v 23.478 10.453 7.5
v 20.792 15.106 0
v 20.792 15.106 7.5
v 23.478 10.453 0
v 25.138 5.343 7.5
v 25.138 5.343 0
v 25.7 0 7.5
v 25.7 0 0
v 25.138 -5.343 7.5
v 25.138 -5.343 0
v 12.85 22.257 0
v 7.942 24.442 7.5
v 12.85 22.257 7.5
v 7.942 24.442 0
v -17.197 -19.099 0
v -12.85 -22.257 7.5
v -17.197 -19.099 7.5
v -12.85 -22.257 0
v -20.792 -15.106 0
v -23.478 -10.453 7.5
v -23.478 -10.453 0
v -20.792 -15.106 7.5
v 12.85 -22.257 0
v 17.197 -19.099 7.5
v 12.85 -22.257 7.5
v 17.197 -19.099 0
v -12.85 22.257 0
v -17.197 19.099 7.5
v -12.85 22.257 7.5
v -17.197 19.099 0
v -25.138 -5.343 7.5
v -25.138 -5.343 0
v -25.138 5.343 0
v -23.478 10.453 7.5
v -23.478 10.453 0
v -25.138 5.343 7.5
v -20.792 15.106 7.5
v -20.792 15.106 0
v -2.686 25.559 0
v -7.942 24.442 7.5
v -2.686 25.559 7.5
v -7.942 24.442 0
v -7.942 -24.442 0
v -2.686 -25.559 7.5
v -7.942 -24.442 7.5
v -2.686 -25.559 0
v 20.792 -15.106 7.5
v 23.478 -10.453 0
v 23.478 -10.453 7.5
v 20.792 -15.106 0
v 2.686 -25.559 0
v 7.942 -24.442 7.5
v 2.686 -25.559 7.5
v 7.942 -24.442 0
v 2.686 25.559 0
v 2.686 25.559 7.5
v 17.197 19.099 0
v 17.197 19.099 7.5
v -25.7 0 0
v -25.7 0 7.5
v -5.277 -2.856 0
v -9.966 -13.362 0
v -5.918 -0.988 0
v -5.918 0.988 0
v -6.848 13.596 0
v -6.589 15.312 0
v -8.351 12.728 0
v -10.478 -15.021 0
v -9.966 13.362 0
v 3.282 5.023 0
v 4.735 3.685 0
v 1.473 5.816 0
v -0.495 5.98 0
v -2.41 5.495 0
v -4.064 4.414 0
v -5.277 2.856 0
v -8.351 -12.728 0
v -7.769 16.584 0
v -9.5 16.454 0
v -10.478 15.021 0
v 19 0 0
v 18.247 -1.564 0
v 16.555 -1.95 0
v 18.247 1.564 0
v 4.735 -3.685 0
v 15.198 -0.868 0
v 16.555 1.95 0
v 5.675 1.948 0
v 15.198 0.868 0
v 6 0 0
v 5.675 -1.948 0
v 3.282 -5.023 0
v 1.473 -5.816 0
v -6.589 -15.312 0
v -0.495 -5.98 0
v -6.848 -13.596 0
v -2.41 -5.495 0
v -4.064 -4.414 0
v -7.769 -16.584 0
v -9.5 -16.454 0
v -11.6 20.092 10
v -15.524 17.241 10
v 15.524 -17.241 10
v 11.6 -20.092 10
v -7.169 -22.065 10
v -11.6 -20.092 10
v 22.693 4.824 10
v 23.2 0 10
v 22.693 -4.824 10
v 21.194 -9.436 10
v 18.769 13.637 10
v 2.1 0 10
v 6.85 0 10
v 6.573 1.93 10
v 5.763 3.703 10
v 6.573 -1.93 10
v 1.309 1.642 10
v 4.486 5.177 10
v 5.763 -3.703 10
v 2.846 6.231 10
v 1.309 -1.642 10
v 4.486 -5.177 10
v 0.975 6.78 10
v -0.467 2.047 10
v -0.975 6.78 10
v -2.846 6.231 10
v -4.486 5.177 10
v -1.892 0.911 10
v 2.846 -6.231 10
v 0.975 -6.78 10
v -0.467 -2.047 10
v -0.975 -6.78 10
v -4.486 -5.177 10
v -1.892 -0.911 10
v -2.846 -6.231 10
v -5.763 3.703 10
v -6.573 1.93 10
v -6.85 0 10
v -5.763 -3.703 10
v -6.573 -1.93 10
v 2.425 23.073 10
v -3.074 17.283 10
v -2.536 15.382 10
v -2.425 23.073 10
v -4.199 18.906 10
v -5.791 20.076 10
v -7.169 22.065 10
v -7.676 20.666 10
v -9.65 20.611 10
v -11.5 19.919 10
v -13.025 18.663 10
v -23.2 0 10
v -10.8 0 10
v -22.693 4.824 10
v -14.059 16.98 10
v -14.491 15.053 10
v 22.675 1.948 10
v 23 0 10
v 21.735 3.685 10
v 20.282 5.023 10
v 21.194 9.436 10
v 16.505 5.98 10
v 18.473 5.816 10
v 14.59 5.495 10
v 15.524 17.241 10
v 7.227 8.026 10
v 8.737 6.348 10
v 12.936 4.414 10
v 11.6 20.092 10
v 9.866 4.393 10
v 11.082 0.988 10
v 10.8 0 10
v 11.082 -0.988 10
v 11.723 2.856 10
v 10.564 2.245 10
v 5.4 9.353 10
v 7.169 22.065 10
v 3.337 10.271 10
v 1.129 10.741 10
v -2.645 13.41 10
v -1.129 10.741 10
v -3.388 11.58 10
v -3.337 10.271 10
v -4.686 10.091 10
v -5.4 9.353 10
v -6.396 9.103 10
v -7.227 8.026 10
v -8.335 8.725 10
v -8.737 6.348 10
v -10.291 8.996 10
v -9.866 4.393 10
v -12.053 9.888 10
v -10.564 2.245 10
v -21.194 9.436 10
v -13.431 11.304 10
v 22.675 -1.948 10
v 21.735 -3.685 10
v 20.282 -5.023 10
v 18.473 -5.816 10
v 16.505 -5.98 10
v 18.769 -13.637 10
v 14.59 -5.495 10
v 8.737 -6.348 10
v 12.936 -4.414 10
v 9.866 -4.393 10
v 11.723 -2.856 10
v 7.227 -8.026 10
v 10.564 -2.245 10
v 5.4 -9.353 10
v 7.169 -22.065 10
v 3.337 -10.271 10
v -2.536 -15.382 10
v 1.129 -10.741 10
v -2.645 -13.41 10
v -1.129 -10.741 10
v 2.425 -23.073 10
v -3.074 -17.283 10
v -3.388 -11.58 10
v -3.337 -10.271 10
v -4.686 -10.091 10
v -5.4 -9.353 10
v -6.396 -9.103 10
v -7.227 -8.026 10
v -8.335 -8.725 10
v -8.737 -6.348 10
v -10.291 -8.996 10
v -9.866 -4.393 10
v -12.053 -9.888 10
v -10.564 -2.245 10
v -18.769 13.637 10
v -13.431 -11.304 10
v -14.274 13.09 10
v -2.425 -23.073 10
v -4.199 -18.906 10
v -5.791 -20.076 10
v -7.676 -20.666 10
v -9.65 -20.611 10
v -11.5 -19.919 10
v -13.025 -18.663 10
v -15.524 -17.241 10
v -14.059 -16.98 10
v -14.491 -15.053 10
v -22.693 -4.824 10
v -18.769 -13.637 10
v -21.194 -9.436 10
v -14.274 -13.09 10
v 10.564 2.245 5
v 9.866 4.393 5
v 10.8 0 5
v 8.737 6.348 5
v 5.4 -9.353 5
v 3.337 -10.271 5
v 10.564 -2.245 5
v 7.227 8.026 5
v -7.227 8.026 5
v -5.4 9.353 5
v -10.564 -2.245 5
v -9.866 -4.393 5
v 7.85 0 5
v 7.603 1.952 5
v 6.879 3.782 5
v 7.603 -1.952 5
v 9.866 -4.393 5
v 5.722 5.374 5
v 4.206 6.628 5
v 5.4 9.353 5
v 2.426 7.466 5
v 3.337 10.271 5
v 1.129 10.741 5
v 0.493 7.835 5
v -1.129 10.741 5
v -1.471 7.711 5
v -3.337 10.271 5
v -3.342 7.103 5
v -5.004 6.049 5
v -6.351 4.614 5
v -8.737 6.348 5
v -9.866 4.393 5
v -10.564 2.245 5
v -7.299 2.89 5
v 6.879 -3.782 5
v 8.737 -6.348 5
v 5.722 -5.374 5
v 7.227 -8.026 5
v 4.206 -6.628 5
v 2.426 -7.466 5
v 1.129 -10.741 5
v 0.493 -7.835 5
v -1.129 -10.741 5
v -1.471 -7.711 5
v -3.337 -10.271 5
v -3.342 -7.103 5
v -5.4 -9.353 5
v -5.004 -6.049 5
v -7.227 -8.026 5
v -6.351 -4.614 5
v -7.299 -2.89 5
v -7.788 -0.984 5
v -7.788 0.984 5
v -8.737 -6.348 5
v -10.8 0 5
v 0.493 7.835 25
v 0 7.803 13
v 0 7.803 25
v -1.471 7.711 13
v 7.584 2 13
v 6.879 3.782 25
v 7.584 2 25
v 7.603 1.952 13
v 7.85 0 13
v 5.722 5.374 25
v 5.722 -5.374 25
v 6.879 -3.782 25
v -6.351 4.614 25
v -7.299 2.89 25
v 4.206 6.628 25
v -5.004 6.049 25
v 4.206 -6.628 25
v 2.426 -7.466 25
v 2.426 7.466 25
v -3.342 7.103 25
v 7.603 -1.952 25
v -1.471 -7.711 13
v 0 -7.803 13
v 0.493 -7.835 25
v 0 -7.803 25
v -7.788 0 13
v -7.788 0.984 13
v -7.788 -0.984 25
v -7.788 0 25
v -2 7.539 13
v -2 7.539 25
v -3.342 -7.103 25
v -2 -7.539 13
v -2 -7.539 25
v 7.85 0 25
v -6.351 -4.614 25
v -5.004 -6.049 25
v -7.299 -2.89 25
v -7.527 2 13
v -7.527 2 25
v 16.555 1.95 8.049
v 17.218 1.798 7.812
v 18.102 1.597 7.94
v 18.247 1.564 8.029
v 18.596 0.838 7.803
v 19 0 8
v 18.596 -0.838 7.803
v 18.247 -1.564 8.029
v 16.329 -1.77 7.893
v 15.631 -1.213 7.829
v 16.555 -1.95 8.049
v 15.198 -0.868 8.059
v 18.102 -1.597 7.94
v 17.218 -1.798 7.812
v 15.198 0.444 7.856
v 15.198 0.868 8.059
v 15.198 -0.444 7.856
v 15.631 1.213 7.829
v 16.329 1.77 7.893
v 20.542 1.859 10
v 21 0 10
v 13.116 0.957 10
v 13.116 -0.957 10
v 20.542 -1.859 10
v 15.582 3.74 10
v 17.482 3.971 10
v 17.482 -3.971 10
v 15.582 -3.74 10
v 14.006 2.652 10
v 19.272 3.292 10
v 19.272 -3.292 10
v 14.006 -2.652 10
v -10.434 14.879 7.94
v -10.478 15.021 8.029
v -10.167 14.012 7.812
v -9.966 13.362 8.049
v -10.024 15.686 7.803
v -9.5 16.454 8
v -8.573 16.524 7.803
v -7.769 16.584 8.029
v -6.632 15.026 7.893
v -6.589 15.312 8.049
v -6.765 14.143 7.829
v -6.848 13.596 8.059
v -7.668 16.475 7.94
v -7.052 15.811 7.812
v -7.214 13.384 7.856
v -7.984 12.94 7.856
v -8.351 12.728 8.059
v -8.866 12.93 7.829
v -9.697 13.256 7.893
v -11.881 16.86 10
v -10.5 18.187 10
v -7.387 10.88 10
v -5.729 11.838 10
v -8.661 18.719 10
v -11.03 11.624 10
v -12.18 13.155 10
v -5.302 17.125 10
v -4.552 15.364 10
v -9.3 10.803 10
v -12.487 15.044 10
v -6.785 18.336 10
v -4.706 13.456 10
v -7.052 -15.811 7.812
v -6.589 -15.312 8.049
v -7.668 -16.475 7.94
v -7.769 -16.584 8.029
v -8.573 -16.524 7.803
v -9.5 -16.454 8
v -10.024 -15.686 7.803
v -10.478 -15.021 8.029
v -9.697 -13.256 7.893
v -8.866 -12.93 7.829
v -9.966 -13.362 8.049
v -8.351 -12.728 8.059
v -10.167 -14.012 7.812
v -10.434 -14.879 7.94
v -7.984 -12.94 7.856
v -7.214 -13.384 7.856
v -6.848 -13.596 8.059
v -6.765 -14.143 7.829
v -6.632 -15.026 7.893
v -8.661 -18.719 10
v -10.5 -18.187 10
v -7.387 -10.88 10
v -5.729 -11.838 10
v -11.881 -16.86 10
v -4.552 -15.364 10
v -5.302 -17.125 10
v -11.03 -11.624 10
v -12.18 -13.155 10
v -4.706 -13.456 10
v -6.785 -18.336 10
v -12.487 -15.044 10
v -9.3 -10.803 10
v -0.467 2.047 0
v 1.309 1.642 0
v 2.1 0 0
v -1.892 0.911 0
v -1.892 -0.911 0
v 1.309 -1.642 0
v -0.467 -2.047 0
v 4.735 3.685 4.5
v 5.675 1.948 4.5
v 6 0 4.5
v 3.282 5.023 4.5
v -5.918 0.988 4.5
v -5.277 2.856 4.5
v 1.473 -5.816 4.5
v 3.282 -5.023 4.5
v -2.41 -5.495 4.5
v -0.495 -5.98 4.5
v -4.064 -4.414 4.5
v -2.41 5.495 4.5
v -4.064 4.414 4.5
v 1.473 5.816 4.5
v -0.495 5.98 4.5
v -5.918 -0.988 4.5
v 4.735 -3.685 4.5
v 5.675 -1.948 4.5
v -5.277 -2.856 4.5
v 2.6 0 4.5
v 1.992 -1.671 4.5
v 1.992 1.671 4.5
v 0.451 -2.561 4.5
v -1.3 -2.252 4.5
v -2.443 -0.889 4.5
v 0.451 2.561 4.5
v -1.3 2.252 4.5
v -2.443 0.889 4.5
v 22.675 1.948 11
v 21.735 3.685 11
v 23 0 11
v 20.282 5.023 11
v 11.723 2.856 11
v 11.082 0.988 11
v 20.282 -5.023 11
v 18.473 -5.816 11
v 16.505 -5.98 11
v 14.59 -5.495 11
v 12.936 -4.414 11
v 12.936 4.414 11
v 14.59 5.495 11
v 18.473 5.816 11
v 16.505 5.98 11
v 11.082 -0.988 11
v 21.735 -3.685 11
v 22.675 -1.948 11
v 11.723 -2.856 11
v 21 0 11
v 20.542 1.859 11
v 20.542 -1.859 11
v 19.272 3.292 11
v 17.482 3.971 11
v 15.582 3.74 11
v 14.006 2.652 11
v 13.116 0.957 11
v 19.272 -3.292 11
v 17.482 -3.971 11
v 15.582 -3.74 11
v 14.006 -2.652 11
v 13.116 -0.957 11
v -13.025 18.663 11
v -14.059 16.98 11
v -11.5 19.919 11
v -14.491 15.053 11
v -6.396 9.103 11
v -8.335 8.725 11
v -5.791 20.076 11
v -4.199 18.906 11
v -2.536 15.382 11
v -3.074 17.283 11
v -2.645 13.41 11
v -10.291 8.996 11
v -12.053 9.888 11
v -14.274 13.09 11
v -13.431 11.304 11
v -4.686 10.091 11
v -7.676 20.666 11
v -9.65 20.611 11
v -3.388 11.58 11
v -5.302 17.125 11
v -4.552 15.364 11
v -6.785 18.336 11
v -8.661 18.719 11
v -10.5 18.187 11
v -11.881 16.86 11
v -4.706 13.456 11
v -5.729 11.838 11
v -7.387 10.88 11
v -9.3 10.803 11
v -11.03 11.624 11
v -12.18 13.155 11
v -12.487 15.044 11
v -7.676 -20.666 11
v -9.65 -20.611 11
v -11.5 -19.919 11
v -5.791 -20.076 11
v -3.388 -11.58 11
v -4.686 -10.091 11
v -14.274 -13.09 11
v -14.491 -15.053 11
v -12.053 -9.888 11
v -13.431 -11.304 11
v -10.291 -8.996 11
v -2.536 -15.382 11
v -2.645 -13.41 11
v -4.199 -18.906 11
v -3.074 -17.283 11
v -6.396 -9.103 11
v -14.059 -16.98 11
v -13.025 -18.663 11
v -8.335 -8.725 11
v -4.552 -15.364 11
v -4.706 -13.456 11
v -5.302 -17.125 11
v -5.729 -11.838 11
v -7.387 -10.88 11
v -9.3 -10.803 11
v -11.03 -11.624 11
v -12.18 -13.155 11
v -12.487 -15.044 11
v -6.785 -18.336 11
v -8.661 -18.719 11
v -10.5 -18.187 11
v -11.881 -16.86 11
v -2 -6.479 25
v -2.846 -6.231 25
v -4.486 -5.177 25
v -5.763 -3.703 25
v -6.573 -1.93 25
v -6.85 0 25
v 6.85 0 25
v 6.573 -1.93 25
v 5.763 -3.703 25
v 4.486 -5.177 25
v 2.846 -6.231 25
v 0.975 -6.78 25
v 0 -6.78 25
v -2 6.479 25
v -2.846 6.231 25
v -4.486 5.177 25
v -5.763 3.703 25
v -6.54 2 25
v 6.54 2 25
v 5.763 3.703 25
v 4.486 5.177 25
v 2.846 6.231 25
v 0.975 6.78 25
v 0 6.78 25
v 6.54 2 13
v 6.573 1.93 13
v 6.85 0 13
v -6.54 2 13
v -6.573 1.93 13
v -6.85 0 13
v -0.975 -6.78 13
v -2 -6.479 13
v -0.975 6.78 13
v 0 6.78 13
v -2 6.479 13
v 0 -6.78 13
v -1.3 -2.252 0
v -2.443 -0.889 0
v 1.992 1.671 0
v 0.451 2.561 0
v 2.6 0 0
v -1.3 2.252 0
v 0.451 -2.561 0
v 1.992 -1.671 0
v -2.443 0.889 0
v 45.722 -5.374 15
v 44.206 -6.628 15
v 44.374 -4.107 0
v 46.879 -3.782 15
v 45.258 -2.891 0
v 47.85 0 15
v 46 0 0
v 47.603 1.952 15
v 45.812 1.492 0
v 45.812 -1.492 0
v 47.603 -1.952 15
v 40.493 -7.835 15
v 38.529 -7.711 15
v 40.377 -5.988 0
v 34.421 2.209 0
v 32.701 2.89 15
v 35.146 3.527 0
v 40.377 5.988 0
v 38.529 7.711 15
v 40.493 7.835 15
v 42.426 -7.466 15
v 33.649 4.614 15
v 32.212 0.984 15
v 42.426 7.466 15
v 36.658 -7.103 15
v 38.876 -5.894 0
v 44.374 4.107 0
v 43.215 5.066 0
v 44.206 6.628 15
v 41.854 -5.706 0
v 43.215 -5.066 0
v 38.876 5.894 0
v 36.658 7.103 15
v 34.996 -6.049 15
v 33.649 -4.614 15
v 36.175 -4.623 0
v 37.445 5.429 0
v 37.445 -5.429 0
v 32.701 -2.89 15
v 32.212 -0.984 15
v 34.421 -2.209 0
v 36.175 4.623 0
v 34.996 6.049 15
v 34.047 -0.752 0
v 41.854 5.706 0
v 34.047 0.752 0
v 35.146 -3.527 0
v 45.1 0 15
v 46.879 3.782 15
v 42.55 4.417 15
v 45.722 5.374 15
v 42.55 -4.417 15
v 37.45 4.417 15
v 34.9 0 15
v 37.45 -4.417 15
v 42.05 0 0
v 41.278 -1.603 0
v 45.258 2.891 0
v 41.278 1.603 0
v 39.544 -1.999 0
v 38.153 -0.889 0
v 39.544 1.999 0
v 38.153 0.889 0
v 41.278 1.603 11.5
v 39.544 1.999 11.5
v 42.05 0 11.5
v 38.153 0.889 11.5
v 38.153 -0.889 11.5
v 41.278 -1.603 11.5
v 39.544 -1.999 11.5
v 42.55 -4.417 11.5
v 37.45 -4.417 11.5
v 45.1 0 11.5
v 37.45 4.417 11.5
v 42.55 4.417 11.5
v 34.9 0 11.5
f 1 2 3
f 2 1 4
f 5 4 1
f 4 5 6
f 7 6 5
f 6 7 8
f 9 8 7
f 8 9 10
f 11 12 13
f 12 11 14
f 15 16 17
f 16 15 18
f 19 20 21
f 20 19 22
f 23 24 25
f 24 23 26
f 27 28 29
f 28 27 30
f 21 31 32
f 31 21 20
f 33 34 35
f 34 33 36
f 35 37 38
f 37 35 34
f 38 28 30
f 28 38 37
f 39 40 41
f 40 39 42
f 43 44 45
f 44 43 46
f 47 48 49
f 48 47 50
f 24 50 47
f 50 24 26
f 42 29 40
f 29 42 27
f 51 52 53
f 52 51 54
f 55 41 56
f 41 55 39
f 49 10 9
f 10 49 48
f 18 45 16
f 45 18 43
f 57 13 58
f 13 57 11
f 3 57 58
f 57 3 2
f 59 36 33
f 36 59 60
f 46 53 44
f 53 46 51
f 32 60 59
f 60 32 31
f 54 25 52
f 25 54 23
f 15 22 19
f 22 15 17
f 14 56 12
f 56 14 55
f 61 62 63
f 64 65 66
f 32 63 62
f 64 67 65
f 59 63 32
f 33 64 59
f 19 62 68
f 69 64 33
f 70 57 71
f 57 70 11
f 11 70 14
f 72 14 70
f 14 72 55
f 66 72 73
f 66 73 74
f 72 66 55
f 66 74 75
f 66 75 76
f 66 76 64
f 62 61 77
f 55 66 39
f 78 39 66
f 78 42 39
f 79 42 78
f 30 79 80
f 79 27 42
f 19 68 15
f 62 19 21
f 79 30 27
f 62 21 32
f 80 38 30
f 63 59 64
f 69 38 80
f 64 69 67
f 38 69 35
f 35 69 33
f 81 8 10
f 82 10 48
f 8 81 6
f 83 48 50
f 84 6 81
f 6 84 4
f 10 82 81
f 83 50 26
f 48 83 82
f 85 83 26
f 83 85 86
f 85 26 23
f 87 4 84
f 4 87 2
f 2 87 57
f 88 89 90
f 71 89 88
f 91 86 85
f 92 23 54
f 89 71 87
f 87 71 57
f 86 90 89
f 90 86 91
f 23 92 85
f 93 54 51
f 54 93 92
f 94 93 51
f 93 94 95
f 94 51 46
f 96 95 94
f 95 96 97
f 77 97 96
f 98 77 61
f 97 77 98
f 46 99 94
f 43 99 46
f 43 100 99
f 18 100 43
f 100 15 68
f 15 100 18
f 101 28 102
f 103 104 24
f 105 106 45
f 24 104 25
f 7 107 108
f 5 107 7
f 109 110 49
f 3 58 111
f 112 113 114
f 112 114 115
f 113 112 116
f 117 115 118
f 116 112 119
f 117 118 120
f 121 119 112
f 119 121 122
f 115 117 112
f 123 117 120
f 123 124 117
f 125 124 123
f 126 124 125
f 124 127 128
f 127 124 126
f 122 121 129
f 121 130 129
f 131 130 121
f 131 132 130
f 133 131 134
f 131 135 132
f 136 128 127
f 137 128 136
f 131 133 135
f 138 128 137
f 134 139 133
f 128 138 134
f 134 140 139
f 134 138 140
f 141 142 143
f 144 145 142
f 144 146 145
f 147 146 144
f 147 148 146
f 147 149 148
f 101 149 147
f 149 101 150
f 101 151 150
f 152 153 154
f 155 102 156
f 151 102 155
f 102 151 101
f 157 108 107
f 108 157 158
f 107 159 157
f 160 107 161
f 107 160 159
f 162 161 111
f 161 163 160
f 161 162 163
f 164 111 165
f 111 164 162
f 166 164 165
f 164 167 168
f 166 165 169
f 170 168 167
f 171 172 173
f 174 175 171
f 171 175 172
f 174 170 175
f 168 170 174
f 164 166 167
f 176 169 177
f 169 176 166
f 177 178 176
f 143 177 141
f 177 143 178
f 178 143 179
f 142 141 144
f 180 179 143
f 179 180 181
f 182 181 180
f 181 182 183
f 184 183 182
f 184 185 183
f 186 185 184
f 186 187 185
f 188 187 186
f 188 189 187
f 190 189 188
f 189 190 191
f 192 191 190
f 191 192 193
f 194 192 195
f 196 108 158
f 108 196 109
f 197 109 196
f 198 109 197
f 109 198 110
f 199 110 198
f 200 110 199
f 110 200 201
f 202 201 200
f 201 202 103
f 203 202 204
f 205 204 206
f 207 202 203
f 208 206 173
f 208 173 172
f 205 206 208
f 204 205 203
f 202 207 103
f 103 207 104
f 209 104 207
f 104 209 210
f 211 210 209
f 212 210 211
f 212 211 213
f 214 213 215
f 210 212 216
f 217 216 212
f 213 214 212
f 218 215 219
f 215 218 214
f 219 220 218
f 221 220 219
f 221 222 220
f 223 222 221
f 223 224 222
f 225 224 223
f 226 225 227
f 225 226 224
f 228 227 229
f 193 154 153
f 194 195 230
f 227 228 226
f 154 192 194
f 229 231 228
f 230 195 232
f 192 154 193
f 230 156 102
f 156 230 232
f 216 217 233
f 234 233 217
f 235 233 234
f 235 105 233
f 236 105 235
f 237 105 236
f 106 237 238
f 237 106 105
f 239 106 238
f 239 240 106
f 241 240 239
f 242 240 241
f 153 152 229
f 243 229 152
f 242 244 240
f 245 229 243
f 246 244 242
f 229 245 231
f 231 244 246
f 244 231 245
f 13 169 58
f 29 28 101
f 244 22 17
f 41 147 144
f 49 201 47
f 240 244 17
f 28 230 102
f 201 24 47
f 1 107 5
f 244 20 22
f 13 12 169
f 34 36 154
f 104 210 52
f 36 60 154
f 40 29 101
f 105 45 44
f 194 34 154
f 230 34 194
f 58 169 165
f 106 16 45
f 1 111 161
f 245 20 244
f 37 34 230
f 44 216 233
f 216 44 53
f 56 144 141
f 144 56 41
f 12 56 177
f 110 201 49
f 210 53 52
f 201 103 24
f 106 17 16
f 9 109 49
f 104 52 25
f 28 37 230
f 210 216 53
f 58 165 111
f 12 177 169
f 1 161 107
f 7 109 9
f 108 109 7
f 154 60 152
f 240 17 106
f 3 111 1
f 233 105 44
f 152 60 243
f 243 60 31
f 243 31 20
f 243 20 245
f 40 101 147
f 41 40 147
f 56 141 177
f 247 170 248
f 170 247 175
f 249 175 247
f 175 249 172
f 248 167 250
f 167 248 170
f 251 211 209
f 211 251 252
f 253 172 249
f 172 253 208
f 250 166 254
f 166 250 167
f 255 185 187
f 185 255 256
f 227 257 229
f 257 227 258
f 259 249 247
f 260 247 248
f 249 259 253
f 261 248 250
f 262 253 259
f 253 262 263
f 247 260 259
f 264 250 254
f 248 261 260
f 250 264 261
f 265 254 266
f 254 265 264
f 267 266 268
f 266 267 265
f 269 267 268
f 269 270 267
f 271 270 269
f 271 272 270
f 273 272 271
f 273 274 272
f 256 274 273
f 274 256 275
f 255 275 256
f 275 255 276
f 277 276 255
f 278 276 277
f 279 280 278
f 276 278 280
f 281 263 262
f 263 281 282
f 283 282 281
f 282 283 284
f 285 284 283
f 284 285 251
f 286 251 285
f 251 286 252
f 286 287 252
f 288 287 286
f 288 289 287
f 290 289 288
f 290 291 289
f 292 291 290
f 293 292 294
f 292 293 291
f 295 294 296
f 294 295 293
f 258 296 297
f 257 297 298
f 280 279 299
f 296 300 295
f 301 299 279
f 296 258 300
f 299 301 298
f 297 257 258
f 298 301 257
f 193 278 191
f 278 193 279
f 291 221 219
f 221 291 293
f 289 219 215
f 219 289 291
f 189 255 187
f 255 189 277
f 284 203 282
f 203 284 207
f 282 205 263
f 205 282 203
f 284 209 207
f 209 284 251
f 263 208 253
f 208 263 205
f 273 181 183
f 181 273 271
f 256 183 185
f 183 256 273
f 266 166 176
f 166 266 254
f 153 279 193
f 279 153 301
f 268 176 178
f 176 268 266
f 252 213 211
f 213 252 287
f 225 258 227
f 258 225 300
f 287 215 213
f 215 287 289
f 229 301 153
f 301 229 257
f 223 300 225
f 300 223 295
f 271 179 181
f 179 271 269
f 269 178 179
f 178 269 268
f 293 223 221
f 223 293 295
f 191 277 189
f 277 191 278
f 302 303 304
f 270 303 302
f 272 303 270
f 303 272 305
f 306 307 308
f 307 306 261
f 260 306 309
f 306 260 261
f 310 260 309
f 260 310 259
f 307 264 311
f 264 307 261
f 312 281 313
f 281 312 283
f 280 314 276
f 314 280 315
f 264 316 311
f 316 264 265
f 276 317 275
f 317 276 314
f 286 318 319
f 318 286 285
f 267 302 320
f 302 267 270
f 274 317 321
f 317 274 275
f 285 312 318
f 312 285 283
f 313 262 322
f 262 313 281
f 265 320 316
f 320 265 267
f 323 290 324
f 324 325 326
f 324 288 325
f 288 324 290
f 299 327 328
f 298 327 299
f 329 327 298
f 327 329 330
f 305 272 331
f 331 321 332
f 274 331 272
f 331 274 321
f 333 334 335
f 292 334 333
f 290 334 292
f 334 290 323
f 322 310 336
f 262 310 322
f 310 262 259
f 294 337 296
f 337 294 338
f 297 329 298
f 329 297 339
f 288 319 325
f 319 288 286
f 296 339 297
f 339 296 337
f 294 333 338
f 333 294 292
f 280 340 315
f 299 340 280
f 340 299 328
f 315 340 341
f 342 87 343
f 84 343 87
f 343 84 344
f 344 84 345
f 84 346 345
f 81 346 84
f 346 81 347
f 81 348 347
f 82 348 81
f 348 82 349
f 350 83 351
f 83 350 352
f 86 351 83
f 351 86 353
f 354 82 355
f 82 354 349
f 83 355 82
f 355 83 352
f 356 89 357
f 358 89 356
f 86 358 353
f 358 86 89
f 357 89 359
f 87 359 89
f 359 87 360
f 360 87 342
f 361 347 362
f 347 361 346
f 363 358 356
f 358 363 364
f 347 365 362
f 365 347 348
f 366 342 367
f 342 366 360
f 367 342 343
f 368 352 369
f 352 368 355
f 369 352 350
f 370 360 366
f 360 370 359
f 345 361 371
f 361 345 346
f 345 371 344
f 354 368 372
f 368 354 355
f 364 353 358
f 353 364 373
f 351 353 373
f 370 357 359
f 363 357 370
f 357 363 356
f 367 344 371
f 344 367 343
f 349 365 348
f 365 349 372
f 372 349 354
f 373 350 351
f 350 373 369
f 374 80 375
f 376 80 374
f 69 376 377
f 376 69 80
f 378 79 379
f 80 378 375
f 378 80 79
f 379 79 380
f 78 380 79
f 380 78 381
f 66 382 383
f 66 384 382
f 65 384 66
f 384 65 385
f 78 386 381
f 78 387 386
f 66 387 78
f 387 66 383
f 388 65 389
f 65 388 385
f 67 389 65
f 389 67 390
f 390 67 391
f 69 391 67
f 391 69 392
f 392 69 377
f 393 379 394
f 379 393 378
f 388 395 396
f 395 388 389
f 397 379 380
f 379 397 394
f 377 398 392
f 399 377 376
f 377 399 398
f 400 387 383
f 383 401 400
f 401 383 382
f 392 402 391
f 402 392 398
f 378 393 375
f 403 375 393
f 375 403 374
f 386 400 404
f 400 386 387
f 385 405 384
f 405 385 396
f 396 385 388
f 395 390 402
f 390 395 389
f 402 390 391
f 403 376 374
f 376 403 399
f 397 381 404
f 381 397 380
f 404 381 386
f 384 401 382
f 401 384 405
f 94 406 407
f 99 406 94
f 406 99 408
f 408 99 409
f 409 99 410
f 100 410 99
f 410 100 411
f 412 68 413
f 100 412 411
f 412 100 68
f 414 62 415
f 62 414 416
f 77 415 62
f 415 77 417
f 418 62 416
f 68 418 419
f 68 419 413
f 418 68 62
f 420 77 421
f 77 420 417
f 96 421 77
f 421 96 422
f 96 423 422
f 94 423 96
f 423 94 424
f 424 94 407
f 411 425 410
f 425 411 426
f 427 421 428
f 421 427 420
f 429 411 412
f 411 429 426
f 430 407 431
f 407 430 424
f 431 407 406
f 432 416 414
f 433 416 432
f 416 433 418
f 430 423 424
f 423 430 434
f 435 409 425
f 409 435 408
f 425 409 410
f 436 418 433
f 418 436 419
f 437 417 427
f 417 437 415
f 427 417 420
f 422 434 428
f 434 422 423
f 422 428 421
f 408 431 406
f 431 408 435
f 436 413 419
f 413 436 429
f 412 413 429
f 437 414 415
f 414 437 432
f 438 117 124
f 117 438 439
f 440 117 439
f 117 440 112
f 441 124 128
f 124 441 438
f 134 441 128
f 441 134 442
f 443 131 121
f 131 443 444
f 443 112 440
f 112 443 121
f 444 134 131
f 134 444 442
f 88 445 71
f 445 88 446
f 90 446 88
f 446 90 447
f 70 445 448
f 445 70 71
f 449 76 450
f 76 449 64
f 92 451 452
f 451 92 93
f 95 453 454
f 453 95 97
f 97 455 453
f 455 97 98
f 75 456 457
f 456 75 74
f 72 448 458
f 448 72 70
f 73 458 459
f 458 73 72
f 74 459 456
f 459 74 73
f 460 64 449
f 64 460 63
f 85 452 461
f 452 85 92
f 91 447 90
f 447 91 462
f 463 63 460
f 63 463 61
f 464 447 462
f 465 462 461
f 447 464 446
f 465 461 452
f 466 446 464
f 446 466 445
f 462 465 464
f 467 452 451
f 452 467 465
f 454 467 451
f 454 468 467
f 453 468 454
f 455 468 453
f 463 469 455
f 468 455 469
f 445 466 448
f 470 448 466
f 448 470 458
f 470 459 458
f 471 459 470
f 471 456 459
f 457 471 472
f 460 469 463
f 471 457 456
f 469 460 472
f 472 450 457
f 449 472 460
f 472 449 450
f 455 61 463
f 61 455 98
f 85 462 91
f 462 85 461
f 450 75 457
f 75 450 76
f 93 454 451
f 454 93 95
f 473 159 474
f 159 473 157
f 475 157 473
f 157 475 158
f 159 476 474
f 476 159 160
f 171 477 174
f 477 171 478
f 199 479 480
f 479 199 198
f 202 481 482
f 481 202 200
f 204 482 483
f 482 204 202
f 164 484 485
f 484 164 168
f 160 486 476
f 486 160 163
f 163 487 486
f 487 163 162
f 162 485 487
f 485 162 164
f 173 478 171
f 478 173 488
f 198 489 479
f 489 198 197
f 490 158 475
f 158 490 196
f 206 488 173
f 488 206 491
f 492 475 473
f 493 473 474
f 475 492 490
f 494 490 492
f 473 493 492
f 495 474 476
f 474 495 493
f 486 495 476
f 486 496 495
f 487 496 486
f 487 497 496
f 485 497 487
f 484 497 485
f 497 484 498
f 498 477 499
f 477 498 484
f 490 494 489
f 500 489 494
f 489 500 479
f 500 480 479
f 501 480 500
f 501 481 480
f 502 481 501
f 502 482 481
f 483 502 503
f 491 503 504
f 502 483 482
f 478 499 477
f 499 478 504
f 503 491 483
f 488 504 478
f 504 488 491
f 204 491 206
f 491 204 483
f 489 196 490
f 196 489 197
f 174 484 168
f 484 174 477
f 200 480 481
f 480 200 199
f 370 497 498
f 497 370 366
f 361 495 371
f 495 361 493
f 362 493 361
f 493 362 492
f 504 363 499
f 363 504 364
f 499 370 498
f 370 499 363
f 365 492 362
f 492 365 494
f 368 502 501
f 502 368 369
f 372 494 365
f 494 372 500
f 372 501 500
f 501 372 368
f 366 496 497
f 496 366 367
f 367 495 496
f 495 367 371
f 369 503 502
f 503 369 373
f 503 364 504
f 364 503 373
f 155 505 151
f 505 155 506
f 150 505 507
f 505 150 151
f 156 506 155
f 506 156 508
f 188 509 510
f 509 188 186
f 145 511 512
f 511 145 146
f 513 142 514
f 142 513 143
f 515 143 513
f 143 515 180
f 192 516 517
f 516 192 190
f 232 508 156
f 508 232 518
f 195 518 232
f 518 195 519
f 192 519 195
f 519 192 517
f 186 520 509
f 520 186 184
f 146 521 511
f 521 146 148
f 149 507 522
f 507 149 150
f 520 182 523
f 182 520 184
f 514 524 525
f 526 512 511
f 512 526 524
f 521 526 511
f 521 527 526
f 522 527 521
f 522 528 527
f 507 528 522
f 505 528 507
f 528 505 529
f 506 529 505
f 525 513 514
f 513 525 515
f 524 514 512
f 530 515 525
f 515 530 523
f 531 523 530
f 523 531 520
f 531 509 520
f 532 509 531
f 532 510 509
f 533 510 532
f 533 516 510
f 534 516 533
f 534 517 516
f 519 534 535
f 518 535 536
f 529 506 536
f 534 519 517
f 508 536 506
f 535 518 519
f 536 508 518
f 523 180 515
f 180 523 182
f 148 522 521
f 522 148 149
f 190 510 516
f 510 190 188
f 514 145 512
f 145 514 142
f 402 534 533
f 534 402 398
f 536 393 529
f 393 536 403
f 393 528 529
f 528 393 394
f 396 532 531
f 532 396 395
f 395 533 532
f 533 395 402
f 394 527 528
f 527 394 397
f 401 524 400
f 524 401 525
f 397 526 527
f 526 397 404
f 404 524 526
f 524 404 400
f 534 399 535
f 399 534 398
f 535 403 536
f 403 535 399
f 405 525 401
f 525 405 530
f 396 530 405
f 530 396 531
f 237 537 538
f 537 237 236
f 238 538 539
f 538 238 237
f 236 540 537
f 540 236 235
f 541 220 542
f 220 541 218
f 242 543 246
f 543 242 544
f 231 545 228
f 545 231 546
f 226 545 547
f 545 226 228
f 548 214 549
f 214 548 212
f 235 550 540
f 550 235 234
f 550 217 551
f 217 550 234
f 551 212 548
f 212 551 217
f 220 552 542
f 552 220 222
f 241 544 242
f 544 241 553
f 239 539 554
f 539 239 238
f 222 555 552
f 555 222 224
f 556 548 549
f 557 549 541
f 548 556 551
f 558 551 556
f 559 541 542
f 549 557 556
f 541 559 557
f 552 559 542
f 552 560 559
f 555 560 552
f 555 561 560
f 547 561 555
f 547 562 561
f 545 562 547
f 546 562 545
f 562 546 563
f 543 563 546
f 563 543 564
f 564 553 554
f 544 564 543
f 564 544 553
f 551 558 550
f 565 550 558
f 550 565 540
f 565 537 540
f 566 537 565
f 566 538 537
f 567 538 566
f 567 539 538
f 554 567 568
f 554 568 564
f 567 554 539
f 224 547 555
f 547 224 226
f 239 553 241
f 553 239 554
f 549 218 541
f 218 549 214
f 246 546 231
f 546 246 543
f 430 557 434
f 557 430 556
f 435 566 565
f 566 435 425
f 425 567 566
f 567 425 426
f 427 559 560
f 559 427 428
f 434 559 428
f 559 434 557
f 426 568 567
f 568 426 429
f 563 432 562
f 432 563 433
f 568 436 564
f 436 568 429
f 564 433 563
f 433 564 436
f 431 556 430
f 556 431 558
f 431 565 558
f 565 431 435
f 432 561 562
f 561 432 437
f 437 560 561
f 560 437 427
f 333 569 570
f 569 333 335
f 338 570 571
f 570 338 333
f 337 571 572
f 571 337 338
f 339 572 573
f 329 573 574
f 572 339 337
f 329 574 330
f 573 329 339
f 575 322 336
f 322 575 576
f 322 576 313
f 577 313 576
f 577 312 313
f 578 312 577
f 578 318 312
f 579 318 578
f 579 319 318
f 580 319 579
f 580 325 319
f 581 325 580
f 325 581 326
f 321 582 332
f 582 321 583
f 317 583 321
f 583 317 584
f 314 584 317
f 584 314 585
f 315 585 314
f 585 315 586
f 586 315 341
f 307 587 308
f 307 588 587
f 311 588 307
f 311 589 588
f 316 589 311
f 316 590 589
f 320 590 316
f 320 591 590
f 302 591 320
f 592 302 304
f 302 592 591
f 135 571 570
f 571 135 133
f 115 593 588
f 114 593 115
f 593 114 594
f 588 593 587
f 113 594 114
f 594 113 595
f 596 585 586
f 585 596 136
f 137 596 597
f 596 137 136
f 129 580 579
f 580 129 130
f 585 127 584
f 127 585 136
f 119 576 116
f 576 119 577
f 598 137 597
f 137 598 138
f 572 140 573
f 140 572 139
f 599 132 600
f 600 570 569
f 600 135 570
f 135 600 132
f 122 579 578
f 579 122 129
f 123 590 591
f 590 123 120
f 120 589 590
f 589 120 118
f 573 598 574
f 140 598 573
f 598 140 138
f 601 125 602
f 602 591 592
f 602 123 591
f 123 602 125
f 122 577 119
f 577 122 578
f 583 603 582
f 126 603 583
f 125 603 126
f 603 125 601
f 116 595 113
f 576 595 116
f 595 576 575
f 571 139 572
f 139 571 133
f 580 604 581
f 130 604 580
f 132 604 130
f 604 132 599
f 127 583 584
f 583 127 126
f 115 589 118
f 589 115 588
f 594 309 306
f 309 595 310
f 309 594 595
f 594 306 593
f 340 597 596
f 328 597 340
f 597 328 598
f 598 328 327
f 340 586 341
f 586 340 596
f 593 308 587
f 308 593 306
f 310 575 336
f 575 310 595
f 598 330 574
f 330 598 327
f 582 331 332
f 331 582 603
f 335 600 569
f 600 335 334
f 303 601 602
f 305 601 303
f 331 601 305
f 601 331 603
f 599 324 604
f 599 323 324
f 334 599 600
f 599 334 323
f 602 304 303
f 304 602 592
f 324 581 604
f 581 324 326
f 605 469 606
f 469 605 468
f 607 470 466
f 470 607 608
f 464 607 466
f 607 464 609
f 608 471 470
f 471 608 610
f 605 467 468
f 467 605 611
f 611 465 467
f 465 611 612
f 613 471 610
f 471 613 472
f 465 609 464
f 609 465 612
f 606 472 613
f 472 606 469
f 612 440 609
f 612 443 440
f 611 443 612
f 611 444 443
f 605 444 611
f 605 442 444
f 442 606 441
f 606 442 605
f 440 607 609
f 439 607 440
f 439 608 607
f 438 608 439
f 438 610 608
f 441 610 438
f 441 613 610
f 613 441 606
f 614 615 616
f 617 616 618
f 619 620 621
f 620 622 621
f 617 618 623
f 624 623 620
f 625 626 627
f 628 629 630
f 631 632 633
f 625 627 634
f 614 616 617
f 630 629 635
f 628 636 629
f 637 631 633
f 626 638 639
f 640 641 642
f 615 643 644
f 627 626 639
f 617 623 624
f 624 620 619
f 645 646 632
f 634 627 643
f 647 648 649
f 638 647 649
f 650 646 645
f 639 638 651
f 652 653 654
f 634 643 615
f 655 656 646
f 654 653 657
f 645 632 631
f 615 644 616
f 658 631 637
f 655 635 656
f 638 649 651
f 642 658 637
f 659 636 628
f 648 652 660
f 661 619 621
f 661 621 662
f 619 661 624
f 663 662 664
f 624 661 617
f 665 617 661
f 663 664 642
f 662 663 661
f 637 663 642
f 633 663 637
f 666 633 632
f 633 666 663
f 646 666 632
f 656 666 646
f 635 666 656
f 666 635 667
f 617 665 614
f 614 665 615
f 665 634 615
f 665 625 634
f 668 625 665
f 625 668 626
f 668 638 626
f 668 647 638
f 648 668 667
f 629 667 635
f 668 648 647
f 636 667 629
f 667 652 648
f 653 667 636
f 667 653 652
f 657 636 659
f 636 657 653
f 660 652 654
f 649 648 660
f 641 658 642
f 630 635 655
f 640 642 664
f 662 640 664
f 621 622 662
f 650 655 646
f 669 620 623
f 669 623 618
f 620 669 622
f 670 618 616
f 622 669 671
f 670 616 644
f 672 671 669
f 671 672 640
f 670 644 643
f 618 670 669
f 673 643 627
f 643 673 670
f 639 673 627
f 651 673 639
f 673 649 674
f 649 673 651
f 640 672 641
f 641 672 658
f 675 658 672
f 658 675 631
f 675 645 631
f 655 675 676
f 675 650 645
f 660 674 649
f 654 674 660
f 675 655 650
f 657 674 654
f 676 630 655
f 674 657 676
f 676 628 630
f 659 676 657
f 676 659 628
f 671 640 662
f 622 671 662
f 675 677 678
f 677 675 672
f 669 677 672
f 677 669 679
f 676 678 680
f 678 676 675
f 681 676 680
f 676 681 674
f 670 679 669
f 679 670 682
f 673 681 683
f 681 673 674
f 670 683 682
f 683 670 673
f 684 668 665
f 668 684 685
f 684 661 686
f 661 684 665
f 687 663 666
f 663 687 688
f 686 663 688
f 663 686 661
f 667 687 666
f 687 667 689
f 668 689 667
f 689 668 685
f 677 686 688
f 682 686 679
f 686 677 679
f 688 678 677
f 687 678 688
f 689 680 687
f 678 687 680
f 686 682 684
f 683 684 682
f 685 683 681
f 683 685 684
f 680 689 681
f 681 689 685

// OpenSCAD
// file: screw_shape.scad
screw_shape(10,5,30);

module screw_shape(dHead,dThread,length) {
    
    headHeight = dThread;
    tipHeight = dThread/(2*tan(30));
    
    translate([0,0,tipHeight]) cylinder(d=dThread, h=length-tipHeight);
    translate([0,0,length-dThread]) cylinder(r1=0, r2=dHead/2, h=dThread);
    cylinder(r1=0, r2=dThread/2, h=tipHeight);
}
// file: pipe.scad
pipe(10,8,20);


module pipe(dExt,dInt,length) {
    difference() {
        cylinder(d=dExt,length);
        cylinder(d=dInt,length);
    };
}
// main file
use <pipe.scad>
use <screw_shape.scad>

pipe_holder(dExt=21.4,dInt=15.8);

translate([40,0,0]) strut(15.7,12,15);

//slotted_pipe(100,90,100,80);

baseHeight=10;
dBolt=4;
dWasher=11.5;
dNut=10;
hBoltHead=4.5;
hNut=3.5;
extFit=0.2;
intFit=0.1;
dScrewHead=8;
dScrewThread=4;
screwHeight=20;
screwHoleOffset=17;

module pipe_holder(dExt,dInt) {
    difference() {
        base(dExt,dInt,height=baseHeight);
        cylinder(d=dBolt+extFit,h=baseHeight);
        cylinder(d=dWasher+0.5,h=hBoltHead);
        translate([ 0, 0, baseHeight/2 ]) pipe(dExt+extFit,dInt-intFit,5);
        translate([ screwHoleOffset, 0, baseHeight-screwHeight ]) 
            screw_shape(dScrewHead,dScrewThread,screwHeight);
        rotate(120) 
            translate([ screwHoleOffset, 0, baseHeight-screwHeight ]) 
            screw_shape(dScrewHead,dScrewThread,screwHeight);
        rotate(-120) 
            translate([ screwHoleOffset, 0, baseHeight-screwHeight ]) 
                screw_shape(dScrewHead,dScrewThread,screwHeight);
    }
    translate([ screwHoleOffset, 0, baseHeight ]) pipe(dScrewHead+4,dScrewHead,1);
    rotate(120) translate([ screwHoleOffset, 0, baseHeight ]) pipe(dScrewHead+4,dScrewHead,1);
    rotate(-120) translate([ screwHoleOffset, 0, baseHeight ]) pipe(dScrewHead+4,dScrewHead,1);
    translate([ 0, 0, baseHeight ]) slotted_pipe(dInt-intFit,dInt-2-intFit,15,12);
    pipe(dExt=dBolt+extFit+1,dInt=dBolt+extFit,length=hBoltHead);
}

module base(dExt,dInt,height) {
    cylinder(d=dExt+30,h=height*0.75);
    translate([ 0, 0, height*0.75 ]) cylinder(r1=(dExt+30)/2,r2=(dExt+25)/2,h=height*0.25);
}    

module slotted_pipe(dExt,dInt,length,depth) {
    difference() {
        pipe(dExt,dInt,length);
        translate([ -dExt/2, 0, length-depth ]) cube([dExt,2,depth]);
        rotate([0,0,90]) translate([ -dExt/2, 0, length-depth ]) cube([dExt,2,depth]);
    }
}

module strut(dExt,dInt,length) {
    difference(){
        cylinder(r1=dInt/2,r2=dExt/2,h=length);
        cylinder(d=dBolt+intFit,h=length);        
        translate([0,0,length-hNut]) cylinder(d=dNut+extFit,h=hNut,$fn=6);        
    }
}
